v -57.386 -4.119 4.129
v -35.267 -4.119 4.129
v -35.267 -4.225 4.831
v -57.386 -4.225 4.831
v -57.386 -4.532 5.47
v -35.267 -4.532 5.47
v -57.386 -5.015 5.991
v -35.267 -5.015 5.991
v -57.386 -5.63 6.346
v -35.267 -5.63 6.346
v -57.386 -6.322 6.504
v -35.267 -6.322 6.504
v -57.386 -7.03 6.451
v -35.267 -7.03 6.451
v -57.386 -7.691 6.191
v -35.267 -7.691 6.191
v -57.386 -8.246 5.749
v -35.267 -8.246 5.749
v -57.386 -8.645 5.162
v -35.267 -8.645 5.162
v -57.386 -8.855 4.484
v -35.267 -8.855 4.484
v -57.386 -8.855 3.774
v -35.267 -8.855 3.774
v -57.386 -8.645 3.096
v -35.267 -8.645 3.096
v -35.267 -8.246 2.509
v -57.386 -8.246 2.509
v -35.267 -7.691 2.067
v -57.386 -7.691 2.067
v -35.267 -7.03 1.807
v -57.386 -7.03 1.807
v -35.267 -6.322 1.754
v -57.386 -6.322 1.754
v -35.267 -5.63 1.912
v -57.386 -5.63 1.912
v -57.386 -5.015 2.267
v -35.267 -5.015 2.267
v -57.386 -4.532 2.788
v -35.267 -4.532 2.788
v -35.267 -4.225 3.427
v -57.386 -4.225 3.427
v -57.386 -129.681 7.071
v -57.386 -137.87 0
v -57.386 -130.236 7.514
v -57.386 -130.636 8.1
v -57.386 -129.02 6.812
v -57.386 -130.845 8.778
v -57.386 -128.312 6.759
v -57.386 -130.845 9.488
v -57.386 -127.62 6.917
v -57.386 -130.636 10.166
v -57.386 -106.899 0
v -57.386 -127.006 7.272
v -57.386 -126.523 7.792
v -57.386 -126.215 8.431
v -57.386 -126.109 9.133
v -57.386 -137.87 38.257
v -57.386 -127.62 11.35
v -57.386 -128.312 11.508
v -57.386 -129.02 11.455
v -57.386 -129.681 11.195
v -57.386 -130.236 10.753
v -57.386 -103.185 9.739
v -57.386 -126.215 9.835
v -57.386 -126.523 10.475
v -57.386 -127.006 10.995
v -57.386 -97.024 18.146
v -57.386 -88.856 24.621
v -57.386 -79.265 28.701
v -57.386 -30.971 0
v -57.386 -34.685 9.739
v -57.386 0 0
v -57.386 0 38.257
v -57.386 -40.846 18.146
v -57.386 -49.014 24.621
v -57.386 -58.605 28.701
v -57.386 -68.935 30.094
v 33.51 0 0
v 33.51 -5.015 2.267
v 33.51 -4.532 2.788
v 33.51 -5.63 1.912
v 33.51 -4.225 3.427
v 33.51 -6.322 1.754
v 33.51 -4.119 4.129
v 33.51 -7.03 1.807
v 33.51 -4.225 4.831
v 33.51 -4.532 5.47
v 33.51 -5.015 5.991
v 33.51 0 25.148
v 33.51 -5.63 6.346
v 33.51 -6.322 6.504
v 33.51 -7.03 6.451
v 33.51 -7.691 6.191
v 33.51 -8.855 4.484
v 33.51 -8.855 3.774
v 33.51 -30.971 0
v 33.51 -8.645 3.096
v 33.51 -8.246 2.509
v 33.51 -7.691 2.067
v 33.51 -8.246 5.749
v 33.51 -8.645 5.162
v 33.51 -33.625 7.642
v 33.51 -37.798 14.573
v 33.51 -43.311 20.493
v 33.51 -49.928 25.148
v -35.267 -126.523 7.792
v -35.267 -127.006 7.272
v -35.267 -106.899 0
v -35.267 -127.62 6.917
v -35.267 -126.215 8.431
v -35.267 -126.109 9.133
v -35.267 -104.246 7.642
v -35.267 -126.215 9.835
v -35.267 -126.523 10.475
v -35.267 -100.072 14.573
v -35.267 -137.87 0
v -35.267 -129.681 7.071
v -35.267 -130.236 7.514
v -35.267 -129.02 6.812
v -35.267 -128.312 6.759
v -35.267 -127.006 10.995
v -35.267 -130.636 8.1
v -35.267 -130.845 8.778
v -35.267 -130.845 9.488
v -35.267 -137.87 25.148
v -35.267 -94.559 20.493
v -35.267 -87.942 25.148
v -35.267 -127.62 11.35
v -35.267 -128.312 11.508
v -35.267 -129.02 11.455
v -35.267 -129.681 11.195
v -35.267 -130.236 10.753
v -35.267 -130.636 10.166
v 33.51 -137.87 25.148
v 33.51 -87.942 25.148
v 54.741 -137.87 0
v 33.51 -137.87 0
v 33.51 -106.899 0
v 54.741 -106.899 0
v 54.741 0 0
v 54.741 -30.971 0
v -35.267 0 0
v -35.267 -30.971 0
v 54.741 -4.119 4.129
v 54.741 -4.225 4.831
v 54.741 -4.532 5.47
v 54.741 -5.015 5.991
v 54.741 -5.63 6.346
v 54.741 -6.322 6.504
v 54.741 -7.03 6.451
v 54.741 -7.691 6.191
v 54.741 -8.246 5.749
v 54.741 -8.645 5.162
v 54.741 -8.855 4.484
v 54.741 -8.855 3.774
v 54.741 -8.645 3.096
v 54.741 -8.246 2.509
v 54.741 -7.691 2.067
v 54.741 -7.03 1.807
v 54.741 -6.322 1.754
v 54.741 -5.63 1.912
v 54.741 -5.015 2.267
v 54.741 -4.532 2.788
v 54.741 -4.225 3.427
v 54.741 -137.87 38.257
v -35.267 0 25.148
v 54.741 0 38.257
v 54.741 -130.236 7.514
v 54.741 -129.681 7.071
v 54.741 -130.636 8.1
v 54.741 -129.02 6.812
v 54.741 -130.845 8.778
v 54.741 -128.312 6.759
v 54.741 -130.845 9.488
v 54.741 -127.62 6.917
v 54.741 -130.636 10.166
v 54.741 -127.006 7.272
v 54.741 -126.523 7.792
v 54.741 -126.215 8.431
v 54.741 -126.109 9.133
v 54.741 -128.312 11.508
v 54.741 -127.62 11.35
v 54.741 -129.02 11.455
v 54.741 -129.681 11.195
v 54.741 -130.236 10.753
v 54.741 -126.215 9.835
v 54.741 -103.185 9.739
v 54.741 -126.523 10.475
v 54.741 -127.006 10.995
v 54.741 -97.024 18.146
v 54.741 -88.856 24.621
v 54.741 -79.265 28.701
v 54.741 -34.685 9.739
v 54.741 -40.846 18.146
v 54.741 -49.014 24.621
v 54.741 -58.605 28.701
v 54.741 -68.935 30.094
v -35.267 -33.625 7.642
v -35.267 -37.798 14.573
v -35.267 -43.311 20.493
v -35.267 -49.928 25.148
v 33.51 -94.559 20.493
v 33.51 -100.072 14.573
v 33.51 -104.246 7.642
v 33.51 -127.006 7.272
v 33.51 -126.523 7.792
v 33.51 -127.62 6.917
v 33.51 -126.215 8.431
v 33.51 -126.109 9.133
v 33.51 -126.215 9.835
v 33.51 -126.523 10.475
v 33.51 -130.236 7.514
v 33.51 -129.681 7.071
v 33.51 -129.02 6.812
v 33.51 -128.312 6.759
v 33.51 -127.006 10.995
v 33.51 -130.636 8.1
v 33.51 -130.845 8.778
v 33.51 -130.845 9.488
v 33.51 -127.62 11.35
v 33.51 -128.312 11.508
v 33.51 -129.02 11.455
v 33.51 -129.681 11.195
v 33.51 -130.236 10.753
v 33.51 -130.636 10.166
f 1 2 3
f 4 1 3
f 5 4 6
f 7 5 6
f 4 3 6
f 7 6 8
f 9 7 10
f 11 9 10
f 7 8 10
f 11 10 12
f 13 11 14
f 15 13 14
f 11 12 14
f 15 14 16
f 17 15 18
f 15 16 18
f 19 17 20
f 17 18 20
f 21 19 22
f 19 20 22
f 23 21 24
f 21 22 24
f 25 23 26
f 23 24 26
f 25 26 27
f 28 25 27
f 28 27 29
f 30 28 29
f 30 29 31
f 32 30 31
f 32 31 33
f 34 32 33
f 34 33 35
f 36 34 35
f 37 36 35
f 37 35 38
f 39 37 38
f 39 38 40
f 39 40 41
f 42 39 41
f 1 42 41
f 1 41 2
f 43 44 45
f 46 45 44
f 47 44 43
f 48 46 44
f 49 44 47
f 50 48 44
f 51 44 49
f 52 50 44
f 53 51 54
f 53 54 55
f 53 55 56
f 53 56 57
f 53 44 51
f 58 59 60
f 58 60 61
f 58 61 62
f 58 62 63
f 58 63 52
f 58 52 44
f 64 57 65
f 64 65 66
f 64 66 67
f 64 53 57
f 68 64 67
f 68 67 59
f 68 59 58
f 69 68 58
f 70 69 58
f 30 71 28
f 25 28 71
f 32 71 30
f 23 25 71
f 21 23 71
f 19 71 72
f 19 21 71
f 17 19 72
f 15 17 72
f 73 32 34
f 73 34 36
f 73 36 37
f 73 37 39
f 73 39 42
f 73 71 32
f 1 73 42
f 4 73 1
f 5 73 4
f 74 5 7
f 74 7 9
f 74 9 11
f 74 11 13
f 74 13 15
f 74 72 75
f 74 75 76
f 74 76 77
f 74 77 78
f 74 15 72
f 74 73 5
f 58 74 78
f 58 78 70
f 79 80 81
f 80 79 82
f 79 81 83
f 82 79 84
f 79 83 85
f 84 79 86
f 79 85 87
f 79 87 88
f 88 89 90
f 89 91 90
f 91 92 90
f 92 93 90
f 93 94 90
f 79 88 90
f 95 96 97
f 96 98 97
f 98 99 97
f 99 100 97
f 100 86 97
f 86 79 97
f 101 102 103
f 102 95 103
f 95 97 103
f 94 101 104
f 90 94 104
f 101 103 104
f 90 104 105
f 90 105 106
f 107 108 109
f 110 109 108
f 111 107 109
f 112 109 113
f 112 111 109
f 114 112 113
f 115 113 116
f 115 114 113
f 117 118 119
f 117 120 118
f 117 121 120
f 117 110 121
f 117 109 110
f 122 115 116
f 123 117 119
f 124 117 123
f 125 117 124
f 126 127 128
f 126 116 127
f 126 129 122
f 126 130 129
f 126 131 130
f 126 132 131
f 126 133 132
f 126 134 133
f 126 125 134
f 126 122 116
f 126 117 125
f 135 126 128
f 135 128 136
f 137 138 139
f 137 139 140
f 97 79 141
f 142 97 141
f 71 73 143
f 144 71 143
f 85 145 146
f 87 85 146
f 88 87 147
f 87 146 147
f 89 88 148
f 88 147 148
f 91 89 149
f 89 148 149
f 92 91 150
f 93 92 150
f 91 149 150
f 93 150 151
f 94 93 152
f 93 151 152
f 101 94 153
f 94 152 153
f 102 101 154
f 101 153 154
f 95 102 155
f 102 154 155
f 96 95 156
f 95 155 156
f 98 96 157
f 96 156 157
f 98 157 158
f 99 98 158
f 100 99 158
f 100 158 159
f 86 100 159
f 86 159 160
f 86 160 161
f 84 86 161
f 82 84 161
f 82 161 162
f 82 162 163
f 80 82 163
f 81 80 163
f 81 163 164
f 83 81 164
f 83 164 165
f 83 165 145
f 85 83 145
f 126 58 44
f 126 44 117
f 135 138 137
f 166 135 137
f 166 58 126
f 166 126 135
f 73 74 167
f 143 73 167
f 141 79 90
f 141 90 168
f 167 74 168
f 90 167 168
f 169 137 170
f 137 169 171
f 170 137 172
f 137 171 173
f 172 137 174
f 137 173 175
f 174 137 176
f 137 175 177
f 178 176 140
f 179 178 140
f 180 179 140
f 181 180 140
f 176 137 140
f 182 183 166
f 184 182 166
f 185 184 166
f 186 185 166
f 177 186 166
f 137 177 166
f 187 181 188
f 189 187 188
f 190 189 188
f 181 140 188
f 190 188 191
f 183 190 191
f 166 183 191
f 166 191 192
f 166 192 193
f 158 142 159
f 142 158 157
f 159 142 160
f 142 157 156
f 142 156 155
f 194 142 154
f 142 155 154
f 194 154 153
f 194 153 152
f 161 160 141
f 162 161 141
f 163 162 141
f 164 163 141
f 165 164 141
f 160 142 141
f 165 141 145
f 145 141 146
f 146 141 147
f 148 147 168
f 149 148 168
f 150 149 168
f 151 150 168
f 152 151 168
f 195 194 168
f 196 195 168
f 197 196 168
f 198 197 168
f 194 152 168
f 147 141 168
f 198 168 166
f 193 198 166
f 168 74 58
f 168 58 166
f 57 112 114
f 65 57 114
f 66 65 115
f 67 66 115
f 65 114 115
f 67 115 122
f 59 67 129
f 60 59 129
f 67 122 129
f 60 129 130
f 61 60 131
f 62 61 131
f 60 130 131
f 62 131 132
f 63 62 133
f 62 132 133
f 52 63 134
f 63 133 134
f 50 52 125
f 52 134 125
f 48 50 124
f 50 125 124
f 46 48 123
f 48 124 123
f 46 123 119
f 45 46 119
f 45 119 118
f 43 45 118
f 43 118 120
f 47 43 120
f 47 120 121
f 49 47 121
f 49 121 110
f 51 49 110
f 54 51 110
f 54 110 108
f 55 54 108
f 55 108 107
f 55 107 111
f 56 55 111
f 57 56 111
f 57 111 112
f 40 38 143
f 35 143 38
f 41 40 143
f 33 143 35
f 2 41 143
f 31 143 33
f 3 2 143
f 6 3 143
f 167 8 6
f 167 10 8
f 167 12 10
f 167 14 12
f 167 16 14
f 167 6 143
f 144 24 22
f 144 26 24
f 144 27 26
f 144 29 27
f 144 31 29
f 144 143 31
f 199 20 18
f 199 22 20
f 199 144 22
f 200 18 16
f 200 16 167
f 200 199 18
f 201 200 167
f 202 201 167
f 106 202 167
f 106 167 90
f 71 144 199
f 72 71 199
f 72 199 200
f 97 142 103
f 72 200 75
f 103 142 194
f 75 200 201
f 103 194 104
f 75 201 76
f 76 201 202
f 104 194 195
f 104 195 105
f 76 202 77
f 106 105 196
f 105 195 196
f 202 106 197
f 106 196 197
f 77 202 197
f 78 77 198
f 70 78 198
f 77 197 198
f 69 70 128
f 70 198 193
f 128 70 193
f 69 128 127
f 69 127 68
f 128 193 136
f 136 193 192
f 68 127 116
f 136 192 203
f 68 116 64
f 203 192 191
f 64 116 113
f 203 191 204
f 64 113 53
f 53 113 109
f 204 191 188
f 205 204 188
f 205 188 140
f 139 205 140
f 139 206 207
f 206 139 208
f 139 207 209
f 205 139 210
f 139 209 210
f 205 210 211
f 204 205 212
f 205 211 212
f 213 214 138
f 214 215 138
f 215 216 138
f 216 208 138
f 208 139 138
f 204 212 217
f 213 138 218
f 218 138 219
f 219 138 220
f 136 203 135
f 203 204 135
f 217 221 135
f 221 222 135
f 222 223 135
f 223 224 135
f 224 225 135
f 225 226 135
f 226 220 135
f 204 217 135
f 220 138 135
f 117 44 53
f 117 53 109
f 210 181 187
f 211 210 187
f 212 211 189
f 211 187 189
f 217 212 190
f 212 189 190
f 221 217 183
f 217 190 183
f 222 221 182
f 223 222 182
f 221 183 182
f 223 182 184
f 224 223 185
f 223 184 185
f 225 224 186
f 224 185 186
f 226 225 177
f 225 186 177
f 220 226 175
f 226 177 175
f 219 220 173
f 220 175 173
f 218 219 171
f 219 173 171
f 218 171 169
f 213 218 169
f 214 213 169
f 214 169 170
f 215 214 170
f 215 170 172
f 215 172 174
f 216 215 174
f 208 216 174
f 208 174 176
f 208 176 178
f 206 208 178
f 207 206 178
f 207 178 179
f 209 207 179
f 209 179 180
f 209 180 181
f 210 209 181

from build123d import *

# Parameters (mm, degrees)
F0_W     = 112.1267676353
F0_H     = 38.257420063
F1_DEPTH = 137.870118022
F2_W     = 68.7767341733
F2_H     = 25.1477137208
F3_DEPTH = 137.871118022
F4_R     = 2.38125
F5_DEPTH = 112.1277676353
F6_R     = 2.38125
F7_DEPTH = 112.1277676353
F9_DEPTH = 112.1277676353


with BuildPart() as f1:
    # F0 (on Front) → F1 (new body)
    with BuildSketch(Plane.XZ):
        with Locations((-1.3227313757, 19.1287100315)):
            Rectangle(F0_W, F0_H)
    extrude(amount=F1_DEPTH)

    # F2 (on face) → F3 (cut, through all)
    with BuildSketch(Plane.XZ.offset(137.870118022)):
        with Locations((-0.8782893419, 12.5738568604)):
            Rectangle(F2_W, F2_H)
    extrude(amount=-F3_DEPTH, mode=Mode.SUBTRACT)

    # F4 (on face) → F5 (cut, through all)
    with BuildSketch(Plane.YZ.offset(54.740652442)):
        with Locations((-128.4904330969, 9.1332495213)):
            Circle(F4_R)
    extrude(amount=-F5_DEPTH, mode=Mode.SUBTRACT)

    # F6 (on face) → F7 (cut, through all)
    with BuildSketch(Plane.YZ.offset(54.740652442)):
        with Locations((-6.499979645, 4.1290447116)):
            Circle(F6_R)
    extrude(amount=-F7_DEPTH, mode=Mode.SUBTRACT)

    # F8 (on face) → F9 (cut, through all)
    with BuildSketch(Plane.YZ.offset(54.740652442)):
        with BuildLine():
            Line((-106.8989974441, 0), (-30.9711205779, 0))
            ThreePointArc((-30.9711205779, 0), (-68.935059011, 30.0939472481), (-106.8989974441, 0))
        make_face()
    extrude(amount=-F9_DEPTH, mode=Mode.SUBTRACT)


solid = f1.part
